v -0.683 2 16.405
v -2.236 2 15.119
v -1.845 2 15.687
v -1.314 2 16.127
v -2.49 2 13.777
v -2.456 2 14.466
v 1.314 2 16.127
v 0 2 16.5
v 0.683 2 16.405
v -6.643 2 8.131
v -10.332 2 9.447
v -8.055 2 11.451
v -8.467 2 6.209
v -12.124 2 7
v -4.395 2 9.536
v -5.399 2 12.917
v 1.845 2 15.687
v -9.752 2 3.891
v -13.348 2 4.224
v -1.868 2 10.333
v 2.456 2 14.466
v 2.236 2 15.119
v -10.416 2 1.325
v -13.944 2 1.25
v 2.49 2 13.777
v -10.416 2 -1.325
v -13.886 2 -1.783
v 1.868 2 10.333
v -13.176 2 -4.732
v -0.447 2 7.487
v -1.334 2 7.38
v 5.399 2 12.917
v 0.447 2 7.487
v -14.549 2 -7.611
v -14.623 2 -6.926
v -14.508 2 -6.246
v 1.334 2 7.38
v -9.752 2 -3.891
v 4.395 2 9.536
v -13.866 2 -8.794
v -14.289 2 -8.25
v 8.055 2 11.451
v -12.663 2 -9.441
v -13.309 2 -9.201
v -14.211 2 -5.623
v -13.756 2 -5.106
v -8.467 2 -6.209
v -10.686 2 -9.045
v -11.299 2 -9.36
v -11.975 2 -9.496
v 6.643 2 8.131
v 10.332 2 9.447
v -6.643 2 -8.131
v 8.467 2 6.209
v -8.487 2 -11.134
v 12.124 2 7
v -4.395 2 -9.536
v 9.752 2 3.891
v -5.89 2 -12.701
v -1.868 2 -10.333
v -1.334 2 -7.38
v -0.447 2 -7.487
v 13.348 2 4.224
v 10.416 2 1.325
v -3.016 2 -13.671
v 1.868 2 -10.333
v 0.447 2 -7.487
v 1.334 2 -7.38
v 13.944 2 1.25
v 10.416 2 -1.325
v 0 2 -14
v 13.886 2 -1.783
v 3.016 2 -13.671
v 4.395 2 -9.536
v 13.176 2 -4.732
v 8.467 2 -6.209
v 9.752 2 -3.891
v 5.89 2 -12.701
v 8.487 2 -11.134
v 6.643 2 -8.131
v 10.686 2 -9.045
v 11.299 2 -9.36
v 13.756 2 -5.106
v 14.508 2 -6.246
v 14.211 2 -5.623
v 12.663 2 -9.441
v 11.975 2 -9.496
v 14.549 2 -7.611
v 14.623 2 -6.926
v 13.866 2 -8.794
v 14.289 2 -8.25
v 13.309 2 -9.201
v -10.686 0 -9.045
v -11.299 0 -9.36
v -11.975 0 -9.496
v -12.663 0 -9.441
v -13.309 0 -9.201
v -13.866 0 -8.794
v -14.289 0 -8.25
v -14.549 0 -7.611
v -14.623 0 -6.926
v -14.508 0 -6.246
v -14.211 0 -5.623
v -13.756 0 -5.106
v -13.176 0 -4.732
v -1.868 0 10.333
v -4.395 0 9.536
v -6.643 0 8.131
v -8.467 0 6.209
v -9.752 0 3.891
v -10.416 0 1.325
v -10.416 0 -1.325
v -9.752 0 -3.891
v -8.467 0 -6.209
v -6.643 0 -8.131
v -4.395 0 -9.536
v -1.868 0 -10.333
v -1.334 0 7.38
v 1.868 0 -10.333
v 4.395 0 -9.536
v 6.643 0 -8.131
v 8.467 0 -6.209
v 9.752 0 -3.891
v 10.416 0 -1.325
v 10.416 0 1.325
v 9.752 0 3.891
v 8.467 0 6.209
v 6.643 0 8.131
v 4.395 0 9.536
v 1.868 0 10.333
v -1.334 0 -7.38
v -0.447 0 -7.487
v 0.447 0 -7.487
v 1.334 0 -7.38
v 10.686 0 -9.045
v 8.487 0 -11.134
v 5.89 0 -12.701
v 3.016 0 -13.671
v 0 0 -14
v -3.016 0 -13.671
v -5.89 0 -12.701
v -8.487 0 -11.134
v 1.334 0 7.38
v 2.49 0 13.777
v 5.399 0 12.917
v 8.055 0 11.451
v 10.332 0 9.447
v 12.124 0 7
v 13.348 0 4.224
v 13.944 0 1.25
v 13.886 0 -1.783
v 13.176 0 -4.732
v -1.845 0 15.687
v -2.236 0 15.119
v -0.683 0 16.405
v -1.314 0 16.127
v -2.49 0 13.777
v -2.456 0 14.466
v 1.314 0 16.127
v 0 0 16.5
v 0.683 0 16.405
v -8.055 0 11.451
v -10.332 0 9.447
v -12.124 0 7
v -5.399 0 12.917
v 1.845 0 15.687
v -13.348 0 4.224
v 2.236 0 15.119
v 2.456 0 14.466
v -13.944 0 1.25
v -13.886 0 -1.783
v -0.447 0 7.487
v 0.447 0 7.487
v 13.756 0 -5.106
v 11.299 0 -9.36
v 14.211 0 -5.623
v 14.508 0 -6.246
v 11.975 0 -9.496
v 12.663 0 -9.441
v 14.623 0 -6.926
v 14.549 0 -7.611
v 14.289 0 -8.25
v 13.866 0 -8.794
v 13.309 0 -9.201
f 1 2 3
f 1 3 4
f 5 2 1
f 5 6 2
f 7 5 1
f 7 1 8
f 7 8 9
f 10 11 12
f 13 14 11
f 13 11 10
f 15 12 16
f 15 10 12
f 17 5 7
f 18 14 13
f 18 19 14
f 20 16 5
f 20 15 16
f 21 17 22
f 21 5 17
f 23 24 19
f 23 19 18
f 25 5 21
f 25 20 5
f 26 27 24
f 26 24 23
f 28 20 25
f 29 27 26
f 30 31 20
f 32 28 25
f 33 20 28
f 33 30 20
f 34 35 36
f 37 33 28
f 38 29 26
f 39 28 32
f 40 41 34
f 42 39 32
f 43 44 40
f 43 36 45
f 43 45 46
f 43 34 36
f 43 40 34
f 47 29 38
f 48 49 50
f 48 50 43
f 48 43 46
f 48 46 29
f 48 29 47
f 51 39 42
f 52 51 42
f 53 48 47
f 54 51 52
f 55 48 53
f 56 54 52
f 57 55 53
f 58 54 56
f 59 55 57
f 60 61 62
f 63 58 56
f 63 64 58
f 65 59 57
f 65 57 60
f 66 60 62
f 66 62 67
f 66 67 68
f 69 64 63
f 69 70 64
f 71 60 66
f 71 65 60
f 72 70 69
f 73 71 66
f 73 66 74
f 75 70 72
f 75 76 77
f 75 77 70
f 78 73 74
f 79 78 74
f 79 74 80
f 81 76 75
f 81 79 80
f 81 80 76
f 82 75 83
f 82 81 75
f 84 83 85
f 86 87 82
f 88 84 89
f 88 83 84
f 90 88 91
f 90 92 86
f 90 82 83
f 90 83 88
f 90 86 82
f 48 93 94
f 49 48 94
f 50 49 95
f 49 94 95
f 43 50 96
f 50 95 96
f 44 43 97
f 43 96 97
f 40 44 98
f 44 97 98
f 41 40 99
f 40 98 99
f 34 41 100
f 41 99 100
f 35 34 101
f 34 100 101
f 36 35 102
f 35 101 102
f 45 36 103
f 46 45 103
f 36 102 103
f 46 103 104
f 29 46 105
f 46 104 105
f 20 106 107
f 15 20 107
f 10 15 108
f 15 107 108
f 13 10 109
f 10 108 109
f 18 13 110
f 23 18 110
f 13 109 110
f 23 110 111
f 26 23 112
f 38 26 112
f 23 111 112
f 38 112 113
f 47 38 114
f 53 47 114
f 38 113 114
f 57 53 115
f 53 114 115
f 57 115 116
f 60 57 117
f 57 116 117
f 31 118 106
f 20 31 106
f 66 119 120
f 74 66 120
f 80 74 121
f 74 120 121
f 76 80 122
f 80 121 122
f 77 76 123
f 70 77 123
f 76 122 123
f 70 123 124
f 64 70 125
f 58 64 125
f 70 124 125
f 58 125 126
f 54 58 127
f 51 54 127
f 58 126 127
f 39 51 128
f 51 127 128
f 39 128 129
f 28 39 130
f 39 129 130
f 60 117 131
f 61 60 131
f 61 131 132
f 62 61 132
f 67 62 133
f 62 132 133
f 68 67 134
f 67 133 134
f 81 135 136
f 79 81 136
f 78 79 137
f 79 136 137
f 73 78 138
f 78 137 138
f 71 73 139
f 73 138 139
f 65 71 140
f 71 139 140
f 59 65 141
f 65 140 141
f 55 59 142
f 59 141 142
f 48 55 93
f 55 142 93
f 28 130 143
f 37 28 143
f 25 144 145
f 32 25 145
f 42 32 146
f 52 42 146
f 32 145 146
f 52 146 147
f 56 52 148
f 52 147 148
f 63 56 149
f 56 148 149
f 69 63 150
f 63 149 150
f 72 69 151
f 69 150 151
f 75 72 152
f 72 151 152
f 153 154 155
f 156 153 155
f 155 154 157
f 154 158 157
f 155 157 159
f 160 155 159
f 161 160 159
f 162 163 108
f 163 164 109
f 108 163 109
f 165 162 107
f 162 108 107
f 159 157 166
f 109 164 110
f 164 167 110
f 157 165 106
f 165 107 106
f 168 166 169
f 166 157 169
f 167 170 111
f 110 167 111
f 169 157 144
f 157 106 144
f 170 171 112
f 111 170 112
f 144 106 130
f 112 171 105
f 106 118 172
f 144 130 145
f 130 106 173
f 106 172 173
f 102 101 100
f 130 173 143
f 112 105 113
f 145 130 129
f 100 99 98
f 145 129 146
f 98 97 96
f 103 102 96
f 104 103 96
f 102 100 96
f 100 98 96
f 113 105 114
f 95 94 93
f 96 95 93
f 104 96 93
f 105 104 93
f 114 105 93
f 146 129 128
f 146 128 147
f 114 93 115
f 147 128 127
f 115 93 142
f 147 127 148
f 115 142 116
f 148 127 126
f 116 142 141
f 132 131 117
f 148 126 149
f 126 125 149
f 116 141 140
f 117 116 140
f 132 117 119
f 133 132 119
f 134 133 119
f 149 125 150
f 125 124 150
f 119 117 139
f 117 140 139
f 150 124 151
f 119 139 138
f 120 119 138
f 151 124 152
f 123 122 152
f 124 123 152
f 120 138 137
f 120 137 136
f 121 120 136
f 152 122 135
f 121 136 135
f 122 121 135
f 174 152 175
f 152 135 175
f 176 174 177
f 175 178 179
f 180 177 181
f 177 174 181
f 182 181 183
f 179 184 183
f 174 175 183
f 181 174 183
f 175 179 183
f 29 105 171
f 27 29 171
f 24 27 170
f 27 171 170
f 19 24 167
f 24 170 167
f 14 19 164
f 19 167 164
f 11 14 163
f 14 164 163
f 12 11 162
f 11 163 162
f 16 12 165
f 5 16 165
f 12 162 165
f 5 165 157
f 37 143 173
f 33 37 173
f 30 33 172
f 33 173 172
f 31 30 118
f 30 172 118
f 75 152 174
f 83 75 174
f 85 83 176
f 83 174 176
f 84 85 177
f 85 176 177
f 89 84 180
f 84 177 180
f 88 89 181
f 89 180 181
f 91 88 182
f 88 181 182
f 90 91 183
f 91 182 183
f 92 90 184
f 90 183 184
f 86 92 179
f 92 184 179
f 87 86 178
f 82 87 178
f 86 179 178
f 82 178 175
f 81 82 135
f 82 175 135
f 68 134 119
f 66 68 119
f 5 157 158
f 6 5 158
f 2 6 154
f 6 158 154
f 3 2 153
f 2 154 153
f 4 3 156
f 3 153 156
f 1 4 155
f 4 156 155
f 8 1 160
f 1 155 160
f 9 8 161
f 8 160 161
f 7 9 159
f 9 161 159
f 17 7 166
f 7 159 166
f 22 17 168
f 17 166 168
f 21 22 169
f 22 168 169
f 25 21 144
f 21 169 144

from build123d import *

# Parameters (mm, degrees)
SALIENTE_EXTRUIR1_DEPTH = 2


with BuildPart() as part:
    # Croquis1 → Saliente-Extruir1 (new body)
    with BuildSketch(Plane(origin=(0, 0, 0), x_dir=(1, 0, 0), z_dir=(0, 1, 0))):
        with BuildLine():
            ThreePointArc((-13.17605398, 4.731976493), (-12.124355653, -7), (-2.490015137, -13.776785714))
            ThreePointArc((-2.490015137, -13.776785714), (0, -16.5), (2.490015137, -13.776785714))
            ThreePointArc((2.490015137, -13.776785714), (12.124355653, -7), (13.17605398, 4.731976493))
            ThreePointArc((13.17605398, 4.731976493), (14.289419162, 8.25), (10.686038843, 9.044809222))
            ThreePointArc((10.686038843, 9.044809222), (0, 14), (-10.686038843, 9.044809222))
            ThreePointArc((-10.686038843, 9.044809222), (-14.289419162, 8.25), (-13.17605398, 4.731976493))
        make_face()
        with BuildLine():
            Line((1.867511353, -10.332589286), (1.333936681, -7.380420918))
            ThreePointArc((1.333936681, -7.380420918), (0, -7.5), (-1.333936681, -7.380420918))
            Line((-1.333936681, -7.380420918), (-1.867511353, -10.332589286))
            ThreePointArc((-1.867511353, -10.332589286), (-10.5, 0), (-1.867511353, 10.332589286))
            Line((-1.867511353, 10.332589286), (-1.333936681, 7.380420918))
            ThreePointArc((-1.333936681, 7.380420918), (0, 7.5), (1.333936681, 7.380420918))
            Line((1.333936681, 7.380420918), (1.867511353, 10.332589286))
            ThreePointArc((1.867511353, 10.332589286), (10.5, 0), (1.867511353, -10.332589286))
        make_face(mode=Mode.SUBTRACT)
    extrude(amount=SALIENTE_EXTRUIR1_DEPTH)


solid = part.part
